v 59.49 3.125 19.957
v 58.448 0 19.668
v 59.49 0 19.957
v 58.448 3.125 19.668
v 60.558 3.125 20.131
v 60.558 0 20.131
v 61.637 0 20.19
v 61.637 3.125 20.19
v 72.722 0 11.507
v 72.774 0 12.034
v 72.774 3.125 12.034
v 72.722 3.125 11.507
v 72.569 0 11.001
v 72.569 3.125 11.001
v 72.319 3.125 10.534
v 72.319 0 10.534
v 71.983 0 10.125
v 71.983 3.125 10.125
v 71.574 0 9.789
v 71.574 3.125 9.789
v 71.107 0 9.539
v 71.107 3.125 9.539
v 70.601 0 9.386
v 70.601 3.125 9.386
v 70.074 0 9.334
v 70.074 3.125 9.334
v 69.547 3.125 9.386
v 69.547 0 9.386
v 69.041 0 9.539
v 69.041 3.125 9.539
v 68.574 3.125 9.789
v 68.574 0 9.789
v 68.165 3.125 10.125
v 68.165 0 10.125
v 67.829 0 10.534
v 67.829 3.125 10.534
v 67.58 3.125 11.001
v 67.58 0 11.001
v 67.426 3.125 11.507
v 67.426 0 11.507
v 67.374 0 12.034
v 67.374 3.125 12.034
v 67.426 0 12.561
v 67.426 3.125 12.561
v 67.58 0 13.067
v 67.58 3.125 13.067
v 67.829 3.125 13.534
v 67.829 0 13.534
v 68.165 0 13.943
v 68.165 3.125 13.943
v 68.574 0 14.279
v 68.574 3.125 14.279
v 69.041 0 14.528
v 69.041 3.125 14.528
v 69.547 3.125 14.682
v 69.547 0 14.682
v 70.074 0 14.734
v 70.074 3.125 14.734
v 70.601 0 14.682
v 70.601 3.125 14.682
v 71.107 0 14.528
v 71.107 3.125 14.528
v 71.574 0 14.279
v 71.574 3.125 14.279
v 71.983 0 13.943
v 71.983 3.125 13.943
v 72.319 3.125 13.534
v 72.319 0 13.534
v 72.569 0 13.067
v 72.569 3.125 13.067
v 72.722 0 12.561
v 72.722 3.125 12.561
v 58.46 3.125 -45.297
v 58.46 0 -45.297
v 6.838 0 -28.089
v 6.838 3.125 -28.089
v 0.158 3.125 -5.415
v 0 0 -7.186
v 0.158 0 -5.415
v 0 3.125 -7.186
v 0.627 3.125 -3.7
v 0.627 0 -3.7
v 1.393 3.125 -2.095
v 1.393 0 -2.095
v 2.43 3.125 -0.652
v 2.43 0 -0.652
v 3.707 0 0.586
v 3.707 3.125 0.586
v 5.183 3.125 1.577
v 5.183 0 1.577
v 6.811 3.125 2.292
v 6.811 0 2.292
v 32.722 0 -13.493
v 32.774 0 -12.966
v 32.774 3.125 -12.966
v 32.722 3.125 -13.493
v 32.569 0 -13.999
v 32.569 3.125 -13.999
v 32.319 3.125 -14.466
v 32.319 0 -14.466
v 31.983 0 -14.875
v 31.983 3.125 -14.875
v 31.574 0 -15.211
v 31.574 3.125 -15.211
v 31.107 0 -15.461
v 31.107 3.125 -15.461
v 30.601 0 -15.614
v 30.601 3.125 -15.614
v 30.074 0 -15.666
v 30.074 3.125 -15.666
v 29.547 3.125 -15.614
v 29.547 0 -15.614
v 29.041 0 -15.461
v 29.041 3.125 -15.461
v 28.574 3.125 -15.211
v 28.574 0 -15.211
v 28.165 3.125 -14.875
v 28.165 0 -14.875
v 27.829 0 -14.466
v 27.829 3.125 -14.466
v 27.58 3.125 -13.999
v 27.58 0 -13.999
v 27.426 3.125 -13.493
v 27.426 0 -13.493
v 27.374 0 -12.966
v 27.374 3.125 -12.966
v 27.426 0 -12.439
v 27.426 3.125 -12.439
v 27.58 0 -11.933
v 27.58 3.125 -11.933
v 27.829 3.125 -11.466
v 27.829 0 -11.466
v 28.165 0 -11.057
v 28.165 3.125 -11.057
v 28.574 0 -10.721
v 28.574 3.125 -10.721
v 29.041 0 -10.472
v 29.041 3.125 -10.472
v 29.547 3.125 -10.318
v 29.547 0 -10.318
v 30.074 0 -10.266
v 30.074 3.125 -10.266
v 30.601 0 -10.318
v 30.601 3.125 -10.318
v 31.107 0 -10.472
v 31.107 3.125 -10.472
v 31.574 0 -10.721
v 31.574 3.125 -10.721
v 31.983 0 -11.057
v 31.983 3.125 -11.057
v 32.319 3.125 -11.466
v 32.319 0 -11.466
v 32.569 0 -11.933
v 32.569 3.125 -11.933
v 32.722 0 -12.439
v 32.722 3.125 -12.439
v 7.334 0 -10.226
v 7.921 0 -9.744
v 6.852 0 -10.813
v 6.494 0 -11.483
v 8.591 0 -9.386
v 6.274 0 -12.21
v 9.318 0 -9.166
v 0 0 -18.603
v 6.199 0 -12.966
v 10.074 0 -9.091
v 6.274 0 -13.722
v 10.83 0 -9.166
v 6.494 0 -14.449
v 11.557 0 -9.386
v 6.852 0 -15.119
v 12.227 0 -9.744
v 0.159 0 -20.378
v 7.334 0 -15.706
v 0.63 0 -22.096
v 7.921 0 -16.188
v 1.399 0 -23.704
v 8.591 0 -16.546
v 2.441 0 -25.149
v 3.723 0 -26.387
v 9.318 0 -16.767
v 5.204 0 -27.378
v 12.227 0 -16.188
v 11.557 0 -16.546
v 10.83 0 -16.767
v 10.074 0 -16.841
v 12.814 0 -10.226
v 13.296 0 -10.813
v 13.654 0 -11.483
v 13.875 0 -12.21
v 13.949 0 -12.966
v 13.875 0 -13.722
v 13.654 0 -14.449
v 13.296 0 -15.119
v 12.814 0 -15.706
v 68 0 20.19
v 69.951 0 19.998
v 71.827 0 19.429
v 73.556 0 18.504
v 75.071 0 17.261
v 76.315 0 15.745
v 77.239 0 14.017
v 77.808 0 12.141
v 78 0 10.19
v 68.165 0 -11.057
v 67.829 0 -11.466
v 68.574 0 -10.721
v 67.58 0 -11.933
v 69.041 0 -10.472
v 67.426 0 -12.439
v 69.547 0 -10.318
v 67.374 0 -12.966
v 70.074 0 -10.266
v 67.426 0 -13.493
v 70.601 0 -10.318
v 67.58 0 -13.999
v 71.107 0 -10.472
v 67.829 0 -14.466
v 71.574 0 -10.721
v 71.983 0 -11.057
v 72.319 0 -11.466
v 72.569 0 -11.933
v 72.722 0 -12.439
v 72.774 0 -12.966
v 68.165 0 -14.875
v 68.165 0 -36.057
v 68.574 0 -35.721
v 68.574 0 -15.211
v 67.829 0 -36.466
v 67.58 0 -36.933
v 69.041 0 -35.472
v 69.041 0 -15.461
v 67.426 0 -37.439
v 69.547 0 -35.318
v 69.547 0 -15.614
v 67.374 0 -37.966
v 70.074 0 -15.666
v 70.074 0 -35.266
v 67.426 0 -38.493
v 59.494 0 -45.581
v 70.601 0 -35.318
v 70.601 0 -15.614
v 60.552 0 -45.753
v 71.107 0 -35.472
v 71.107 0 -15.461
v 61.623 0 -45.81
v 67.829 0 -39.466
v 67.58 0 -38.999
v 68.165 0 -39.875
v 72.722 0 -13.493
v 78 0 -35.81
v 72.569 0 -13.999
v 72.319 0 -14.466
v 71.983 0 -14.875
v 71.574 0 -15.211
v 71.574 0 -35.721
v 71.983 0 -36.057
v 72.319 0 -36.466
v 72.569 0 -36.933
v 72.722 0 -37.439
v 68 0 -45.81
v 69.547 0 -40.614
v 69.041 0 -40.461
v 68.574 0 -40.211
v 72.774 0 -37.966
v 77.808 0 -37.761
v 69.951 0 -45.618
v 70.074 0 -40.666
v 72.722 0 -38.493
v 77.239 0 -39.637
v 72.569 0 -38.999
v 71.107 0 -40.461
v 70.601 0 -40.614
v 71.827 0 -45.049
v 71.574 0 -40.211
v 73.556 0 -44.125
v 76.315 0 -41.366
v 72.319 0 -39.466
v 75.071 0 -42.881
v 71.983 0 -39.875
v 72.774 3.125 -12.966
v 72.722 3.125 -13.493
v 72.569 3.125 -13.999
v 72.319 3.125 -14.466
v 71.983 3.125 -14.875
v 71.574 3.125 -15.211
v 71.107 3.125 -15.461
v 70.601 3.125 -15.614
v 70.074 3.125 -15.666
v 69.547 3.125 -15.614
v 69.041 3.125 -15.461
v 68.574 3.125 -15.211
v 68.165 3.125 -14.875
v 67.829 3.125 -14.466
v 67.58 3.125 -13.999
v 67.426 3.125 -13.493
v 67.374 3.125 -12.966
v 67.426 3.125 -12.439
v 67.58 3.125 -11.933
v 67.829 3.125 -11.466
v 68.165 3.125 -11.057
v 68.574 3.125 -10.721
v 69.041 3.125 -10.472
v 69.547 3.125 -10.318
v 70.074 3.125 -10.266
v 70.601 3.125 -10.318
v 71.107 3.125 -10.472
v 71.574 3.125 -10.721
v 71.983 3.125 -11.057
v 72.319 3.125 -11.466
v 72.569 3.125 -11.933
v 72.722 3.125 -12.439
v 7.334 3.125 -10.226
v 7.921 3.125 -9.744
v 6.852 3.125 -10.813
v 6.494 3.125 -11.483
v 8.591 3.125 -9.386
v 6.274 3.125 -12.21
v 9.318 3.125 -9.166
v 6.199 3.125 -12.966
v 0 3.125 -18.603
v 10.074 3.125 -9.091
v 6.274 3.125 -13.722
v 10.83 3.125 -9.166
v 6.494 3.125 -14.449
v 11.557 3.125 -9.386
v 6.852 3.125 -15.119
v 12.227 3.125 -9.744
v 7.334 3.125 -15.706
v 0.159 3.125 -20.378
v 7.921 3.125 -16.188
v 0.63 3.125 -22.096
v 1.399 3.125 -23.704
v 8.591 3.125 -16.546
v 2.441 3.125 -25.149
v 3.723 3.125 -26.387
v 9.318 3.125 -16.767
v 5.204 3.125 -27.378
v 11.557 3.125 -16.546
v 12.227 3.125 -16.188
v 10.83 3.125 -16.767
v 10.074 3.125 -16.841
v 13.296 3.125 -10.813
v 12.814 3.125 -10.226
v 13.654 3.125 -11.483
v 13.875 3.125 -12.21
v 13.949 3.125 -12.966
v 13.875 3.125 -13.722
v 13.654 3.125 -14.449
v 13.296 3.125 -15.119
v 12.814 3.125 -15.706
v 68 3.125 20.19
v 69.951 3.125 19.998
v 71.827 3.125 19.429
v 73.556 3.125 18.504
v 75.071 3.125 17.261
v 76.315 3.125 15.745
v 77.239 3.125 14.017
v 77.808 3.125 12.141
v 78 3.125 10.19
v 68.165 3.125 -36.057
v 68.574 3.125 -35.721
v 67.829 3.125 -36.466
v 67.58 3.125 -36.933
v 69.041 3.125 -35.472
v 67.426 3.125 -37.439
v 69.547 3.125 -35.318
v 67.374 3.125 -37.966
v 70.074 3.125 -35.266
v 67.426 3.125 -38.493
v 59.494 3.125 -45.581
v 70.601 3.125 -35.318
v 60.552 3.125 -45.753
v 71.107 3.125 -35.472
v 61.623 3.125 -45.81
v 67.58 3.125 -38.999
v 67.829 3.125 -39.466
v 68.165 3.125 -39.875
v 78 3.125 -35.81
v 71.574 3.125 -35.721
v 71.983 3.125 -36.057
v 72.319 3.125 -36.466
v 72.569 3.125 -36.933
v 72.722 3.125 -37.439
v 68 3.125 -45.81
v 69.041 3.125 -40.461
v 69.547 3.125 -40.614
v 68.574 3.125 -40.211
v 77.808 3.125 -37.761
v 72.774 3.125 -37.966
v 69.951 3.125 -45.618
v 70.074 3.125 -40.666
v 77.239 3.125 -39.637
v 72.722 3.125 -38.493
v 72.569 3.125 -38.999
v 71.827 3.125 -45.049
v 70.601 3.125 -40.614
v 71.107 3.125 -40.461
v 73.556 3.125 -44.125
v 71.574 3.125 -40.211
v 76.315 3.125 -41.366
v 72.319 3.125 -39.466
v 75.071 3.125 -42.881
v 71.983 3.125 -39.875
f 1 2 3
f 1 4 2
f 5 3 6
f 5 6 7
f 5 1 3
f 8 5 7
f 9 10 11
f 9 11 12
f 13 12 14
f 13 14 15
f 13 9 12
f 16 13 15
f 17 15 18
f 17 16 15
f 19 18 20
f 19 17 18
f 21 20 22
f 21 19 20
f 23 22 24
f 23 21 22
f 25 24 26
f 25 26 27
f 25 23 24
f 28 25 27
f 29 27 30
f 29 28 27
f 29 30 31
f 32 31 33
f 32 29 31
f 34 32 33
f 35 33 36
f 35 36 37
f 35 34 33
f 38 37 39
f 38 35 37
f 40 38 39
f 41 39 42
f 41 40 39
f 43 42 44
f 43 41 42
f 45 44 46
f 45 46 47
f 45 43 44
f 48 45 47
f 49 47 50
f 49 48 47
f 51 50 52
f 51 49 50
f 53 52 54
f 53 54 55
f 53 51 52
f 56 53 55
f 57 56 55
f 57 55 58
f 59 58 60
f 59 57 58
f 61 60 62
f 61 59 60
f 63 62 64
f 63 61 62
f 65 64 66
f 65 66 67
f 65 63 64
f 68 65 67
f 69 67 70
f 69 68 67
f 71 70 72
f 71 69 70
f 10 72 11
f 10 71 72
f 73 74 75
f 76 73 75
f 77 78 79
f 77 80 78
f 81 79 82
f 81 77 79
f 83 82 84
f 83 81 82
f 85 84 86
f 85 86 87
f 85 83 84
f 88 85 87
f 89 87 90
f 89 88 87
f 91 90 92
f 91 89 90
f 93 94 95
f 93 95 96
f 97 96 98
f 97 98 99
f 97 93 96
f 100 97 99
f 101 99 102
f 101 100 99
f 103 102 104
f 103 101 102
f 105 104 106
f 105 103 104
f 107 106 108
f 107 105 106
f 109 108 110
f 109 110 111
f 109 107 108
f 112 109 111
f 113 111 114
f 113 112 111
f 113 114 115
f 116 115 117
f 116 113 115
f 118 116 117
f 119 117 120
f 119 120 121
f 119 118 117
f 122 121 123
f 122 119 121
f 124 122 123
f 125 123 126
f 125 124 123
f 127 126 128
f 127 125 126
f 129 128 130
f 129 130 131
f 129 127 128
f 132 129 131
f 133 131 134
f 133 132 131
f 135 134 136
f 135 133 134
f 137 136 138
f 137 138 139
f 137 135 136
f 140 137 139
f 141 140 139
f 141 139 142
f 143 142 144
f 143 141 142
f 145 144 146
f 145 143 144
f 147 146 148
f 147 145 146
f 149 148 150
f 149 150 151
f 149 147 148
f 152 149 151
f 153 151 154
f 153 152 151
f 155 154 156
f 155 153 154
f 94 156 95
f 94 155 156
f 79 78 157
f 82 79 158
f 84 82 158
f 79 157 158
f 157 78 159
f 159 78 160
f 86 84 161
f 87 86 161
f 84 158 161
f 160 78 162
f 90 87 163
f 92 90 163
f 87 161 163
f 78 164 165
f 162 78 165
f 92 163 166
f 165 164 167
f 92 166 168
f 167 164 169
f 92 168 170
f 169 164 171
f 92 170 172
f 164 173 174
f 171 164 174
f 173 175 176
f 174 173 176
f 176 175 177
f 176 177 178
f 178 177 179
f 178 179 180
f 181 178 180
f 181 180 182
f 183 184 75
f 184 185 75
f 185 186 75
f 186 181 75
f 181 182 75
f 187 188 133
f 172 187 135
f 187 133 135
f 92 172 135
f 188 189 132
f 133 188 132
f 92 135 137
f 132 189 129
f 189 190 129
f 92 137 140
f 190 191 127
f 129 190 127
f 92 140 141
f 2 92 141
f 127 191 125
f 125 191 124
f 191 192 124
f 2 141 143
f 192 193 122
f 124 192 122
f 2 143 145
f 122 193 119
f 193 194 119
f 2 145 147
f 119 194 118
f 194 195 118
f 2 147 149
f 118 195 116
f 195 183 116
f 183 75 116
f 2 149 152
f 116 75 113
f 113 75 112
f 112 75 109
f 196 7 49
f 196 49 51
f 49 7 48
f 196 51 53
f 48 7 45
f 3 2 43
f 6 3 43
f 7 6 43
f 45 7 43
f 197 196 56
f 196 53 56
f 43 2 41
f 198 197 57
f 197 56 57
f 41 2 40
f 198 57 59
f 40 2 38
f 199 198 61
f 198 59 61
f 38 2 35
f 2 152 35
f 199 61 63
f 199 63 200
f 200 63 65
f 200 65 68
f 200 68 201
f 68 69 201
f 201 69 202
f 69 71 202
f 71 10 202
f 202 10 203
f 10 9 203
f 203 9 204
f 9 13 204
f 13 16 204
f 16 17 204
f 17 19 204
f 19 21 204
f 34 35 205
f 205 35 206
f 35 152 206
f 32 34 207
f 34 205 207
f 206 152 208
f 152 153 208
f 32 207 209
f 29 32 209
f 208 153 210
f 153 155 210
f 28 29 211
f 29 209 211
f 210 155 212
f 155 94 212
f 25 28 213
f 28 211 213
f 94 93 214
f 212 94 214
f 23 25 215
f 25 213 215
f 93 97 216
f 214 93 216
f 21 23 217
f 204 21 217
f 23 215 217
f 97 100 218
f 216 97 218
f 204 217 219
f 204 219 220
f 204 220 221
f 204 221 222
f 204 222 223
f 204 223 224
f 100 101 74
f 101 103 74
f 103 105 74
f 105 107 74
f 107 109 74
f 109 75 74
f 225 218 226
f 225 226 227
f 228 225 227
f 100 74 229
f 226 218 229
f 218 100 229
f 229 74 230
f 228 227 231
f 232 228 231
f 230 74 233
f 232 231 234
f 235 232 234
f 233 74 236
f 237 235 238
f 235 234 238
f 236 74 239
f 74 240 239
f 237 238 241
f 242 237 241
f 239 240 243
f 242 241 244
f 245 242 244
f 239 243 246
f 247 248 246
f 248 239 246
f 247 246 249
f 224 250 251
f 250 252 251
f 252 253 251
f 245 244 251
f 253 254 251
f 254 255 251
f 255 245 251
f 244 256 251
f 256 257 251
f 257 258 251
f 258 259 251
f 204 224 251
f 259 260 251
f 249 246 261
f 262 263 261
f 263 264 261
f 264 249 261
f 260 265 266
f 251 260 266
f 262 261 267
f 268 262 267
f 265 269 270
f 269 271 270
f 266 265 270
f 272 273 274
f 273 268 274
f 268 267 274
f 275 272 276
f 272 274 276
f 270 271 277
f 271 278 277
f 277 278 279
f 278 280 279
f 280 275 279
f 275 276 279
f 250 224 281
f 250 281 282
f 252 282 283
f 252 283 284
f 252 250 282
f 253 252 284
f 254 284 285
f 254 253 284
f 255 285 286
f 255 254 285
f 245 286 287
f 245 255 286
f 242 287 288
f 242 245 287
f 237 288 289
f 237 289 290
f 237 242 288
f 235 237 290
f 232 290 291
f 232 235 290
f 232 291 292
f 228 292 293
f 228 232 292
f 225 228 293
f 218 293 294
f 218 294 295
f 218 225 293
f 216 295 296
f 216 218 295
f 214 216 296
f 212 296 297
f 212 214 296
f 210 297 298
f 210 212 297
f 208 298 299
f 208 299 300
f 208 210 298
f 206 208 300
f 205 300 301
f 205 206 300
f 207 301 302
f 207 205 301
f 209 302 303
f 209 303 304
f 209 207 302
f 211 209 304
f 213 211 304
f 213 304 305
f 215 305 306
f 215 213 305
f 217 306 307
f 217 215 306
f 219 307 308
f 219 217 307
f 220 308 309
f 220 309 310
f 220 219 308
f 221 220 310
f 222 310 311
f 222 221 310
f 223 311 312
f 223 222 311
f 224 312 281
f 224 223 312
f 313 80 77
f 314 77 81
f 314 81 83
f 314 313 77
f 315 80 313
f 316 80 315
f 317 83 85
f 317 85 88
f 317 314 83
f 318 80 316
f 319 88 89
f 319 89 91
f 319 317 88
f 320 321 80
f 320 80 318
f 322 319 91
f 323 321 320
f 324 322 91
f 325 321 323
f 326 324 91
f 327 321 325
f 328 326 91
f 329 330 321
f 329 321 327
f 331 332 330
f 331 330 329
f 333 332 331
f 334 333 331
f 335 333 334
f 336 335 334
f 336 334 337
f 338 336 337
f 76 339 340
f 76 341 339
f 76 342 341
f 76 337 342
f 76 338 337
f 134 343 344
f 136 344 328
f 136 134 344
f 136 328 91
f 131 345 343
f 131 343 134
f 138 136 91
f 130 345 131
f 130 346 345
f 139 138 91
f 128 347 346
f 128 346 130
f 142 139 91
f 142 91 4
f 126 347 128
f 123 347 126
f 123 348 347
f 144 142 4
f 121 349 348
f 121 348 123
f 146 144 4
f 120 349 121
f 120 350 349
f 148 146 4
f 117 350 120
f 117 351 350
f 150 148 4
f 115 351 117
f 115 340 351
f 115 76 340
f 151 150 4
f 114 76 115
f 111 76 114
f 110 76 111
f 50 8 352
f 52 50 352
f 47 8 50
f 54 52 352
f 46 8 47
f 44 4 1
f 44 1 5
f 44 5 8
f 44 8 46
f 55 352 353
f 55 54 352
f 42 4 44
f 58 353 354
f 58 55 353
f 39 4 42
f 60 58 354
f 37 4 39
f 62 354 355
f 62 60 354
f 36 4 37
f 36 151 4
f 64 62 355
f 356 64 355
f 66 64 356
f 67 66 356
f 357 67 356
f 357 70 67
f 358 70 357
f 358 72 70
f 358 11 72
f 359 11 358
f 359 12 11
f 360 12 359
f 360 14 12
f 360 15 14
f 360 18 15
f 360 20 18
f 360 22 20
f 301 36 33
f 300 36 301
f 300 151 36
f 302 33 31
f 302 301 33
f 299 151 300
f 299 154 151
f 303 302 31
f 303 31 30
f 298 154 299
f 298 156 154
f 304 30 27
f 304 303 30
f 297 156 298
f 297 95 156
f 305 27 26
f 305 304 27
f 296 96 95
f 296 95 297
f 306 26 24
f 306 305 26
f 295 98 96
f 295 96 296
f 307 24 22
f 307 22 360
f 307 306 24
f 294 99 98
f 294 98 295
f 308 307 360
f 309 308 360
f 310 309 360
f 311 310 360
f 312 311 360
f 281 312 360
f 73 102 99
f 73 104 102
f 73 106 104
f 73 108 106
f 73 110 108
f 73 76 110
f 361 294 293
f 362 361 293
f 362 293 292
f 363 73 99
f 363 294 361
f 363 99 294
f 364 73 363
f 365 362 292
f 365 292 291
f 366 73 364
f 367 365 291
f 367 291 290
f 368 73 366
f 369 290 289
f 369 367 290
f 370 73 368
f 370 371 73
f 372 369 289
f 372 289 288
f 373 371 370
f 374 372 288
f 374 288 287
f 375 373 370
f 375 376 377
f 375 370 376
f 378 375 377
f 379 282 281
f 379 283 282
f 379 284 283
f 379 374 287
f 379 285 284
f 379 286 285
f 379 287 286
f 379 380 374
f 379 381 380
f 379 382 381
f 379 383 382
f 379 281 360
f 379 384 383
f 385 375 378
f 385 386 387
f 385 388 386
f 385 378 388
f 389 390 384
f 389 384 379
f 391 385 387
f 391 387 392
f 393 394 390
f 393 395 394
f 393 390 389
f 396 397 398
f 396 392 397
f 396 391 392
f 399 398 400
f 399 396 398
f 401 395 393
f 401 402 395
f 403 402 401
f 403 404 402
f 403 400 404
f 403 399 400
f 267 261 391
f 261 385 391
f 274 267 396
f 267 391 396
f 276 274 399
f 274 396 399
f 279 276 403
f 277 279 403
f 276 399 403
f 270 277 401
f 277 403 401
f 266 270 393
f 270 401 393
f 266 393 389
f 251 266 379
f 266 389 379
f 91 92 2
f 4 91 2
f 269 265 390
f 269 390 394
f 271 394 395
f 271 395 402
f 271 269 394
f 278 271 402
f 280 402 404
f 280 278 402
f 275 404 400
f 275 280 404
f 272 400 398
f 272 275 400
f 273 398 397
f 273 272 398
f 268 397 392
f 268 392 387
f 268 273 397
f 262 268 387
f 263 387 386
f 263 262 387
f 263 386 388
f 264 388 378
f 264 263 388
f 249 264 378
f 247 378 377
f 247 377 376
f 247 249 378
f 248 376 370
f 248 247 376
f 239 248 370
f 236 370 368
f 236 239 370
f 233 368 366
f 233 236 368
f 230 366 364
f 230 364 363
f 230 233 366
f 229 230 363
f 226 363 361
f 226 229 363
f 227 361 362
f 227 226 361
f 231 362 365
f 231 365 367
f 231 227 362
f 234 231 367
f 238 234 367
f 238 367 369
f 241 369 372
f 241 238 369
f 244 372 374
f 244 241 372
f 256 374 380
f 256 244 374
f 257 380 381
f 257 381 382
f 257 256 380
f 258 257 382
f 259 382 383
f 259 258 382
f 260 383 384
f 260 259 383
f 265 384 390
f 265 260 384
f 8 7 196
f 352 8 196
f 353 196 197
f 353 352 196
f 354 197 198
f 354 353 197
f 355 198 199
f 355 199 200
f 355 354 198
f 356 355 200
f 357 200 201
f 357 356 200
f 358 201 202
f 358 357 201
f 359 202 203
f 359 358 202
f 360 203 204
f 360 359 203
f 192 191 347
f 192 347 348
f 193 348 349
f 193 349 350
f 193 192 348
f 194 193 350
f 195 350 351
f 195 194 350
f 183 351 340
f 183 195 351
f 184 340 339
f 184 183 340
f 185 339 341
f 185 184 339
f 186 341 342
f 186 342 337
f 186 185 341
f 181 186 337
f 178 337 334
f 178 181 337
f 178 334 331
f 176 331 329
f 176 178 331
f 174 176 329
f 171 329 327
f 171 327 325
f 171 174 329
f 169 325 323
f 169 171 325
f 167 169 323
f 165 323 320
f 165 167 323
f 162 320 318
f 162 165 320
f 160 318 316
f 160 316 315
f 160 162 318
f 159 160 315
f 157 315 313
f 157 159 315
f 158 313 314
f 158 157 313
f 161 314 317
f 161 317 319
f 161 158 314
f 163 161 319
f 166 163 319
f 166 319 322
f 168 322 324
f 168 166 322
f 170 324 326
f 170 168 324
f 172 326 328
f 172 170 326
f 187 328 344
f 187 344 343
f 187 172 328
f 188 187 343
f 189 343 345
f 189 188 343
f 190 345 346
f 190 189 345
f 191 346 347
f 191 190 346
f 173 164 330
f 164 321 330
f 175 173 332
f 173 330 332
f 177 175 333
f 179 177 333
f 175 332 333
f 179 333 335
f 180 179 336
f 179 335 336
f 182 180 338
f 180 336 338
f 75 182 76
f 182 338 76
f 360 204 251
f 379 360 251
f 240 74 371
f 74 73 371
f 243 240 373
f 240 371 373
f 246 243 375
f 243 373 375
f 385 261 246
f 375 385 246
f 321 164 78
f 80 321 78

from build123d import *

# Parameters (mm, degrees)
SKETCH1_R           = 2.7
SKETCH1_R_2         = 3.875
BOSS_EXTRUDE1_DEPTH = 3.125
FILLET1_R           = 10


with BuildPart() as part:
    # Sketch1 → Boss-Extrude1 (new body)
    with BuildSketch(Plane(origin=(0, 0, 0), x_dir=(1, 0, 0), z_dir=(0, 1, 0))):
        Polygon((0, 25.810224973), (0, 0), (60, -20.189775027), (78, -20.189775027), (78, 45.810224973), (60, 45.810224973), align=None)
        with Locations((70.074055608, -12.033915485)):
            Circle(SKETCH1_R, mode=Mode.SUBTRACT)
        with Locations((10.074055608, 12.966084515)):
            Circle(SKETCH1_R_2, mode=Mode.SUBTRACT)
        with Locations((70.074055608, 37.966084515)):
            Circle(SKETCH1_R, mode=Mode.SUBTRACT)
        with Locations((70.074055608, 12.966084515)):
            Circle(SKETCH1_R, mode=Mode.SUBTRACT)
        with Locations((30.074055608, 12.966084515)):
            Circle(SKETCH1_R, mode=Mode.SUBTRACT)
    extrude(amount=BOSS_EXTRUDE1_DEPTH)

    # Fillet1
    fillet1_edges = [part.edges().sort_by_distance(p)[0] for p in [
        (60, 1.5625, -45.810224973),
        (78, 1.5625, -45.810224973),
        (78, 1.5625, 20.189775027),
        (60, 1.5625, 20.189775027),
        (0, 1.5625, 0),
        (0, 1.5625, -25.810224973),
    ]]
    fillet(fillet1_edges, radius=FILLET1_R)


solid = part.part
